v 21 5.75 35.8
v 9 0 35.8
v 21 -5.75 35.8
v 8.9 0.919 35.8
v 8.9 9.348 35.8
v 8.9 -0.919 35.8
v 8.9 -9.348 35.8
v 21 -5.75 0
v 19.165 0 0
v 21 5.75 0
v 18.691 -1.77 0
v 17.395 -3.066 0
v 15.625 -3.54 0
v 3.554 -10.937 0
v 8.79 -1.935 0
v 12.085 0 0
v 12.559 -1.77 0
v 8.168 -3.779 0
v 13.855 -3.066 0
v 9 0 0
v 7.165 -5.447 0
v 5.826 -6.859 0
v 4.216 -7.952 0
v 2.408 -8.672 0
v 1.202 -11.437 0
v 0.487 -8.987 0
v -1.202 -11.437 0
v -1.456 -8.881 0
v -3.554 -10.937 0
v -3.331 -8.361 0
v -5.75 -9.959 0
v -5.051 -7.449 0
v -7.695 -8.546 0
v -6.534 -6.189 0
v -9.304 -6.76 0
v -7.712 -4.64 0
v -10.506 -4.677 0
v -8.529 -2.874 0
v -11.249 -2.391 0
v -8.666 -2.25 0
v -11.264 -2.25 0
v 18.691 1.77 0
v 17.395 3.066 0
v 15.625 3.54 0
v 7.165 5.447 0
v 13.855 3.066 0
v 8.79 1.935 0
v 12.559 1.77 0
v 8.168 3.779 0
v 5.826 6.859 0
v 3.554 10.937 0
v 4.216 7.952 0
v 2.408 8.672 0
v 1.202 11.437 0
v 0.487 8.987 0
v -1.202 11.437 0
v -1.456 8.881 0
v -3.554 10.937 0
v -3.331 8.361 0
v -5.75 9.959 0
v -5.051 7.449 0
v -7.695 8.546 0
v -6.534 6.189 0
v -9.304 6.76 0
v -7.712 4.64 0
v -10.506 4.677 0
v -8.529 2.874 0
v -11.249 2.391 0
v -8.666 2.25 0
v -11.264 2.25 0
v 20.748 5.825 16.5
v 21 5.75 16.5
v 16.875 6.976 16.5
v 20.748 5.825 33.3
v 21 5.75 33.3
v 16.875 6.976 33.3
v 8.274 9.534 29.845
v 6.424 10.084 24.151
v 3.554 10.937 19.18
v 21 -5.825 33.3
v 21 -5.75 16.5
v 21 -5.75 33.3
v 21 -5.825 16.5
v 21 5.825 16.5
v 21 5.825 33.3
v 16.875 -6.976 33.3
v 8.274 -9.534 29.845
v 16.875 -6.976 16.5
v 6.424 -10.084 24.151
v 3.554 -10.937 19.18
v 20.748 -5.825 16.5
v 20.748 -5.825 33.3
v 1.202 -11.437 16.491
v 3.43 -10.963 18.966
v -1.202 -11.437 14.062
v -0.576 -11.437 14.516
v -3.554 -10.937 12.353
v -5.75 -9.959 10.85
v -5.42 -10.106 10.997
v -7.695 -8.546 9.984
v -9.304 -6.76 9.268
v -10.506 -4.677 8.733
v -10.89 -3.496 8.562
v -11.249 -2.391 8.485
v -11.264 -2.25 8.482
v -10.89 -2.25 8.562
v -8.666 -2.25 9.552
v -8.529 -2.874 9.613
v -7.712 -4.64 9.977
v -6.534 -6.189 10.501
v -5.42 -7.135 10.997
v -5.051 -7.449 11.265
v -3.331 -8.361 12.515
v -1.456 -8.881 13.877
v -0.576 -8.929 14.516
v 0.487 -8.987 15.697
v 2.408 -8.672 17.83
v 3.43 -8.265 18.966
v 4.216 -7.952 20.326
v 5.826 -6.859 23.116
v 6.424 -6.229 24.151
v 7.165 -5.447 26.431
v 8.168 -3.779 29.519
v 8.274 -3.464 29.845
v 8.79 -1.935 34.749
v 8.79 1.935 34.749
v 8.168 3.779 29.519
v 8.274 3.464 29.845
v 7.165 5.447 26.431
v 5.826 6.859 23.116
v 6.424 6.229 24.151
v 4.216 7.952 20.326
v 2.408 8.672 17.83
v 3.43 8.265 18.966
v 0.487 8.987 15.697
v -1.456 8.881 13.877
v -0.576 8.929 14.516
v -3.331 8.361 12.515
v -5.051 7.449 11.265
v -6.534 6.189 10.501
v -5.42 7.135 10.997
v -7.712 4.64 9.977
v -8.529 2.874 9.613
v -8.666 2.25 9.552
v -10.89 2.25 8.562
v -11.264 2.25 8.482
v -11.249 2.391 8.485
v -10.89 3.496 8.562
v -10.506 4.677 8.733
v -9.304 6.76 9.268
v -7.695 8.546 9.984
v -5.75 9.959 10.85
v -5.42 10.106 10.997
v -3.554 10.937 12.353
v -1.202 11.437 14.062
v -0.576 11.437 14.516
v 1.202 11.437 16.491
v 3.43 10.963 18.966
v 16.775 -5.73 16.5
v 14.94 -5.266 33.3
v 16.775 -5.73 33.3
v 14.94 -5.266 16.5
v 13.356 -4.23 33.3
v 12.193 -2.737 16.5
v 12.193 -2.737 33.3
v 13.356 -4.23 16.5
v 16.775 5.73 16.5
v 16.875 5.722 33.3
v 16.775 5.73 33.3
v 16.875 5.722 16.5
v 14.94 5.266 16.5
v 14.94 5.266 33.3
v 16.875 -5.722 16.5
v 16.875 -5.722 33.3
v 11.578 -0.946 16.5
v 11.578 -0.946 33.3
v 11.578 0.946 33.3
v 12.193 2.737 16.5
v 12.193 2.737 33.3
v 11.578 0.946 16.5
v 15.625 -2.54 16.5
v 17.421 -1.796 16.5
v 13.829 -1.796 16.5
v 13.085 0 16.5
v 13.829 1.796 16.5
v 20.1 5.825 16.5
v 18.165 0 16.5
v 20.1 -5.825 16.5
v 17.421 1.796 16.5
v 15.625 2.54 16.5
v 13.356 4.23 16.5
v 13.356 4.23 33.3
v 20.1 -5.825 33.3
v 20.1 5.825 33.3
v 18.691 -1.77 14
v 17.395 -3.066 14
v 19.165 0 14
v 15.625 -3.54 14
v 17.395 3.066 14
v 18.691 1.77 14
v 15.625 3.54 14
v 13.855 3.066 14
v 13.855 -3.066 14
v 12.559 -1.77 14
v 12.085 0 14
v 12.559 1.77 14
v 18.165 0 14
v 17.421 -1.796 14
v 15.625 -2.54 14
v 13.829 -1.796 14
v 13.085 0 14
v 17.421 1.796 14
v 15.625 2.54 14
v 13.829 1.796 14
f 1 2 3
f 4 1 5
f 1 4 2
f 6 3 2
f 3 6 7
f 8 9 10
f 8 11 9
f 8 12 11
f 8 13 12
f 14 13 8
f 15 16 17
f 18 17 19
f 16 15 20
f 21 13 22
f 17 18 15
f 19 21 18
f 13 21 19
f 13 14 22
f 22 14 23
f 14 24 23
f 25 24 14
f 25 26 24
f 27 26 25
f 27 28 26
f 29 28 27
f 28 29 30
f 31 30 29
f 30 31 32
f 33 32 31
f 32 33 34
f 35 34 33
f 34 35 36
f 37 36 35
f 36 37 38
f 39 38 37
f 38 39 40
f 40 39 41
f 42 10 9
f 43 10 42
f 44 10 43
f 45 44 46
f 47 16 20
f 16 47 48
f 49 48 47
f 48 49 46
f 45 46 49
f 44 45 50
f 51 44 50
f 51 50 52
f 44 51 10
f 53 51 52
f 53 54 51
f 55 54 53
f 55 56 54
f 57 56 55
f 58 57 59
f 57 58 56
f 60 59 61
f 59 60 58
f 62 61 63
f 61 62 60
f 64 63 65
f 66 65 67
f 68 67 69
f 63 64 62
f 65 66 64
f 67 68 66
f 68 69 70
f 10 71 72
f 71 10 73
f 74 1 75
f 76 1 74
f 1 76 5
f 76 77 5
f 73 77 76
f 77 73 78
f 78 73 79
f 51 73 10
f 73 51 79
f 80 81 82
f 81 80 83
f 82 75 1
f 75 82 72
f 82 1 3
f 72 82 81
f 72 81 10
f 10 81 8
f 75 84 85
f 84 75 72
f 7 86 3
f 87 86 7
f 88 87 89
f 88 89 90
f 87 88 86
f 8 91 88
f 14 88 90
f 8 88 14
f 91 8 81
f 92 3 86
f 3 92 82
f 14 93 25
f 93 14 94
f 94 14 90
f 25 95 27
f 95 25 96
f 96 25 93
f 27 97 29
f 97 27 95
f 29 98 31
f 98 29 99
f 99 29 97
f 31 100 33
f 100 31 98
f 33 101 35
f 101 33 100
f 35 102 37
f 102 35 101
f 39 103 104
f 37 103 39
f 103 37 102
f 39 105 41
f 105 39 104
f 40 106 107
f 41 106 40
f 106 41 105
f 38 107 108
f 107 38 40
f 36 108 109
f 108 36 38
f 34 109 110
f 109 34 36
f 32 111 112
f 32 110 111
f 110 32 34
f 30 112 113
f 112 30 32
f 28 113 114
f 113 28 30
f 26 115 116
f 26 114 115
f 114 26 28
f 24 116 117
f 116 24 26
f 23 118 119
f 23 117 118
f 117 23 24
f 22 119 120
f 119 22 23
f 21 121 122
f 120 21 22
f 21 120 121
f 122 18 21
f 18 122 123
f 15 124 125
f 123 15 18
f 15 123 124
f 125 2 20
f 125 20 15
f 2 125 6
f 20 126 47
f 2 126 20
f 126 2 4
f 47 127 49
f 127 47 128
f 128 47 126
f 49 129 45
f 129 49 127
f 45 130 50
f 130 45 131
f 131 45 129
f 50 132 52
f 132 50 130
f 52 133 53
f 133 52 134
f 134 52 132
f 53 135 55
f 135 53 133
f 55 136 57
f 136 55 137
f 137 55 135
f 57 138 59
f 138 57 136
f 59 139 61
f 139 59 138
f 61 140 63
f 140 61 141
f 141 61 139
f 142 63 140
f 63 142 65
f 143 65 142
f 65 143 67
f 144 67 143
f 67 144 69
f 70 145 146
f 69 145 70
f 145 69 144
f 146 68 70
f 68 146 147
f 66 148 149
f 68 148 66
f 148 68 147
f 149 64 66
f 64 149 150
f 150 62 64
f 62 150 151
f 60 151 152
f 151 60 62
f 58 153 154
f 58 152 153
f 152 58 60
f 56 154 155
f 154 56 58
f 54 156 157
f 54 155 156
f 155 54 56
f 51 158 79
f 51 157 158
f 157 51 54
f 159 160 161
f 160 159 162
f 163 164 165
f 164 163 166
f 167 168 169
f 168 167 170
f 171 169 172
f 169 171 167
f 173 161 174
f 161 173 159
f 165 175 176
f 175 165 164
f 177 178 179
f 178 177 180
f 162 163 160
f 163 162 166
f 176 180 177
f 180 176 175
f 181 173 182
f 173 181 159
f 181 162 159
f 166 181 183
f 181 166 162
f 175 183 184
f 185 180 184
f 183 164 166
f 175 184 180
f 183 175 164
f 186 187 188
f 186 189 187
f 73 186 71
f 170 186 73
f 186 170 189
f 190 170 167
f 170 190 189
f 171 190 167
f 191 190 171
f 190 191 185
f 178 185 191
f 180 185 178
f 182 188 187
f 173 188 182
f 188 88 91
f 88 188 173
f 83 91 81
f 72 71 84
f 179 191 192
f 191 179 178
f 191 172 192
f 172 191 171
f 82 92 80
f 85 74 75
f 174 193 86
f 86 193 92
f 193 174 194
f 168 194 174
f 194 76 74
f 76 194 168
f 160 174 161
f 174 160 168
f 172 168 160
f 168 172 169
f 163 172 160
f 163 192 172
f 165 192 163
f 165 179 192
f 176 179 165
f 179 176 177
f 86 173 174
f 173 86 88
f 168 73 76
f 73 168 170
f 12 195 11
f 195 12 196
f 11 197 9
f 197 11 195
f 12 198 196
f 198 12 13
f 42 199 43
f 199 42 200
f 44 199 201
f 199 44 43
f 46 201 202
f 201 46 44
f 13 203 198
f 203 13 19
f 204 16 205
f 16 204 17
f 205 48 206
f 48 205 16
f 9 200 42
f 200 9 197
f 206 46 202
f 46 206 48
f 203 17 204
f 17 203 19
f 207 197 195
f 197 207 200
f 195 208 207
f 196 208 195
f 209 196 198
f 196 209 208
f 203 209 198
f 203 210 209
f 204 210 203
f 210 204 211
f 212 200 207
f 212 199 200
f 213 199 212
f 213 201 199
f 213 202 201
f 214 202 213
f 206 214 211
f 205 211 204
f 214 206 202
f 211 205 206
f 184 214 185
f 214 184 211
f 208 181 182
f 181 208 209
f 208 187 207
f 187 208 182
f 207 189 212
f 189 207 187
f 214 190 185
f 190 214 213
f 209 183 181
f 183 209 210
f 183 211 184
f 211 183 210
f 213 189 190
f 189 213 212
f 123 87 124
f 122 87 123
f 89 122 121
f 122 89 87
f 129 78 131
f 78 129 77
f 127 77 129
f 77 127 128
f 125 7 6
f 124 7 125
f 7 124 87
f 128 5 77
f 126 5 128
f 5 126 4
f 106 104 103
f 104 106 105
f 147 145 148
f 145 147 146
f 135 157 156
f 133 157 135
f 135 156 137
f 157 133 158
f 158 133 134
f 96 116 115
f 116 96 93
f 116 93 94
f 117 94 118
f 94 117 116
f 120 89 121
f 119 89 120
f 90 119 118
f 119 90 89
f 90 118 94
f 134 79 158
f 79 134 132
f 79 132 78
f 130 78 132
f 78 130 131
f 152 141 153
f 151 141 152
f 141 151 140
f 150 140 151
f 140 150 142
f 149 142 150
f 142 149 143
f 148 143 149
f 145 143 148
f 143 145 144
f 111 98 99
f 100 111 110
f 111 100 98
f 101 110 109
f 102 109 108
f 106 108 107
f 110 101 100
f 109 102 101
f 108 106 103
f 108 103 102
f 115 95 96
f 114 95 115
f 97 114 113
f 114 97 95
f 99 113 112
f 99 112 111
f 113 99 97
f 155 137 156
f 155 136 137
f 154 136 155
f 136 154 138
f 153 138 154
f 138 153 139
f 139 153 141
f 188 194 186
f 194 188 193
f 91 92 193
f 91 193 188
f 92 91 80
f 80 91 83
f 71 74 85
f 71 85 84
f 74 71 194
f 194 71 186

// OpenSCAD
// [FL_INDEX: keywords="openscad, 3d_parametric, Customizable_Laser_Ring, csg_solid" | COT="Parametric OpenSCAD design from 3DCodeverse"]
// Title: Customizable Laser Ring


fingerWidth = 18; 
// your button cell's diameter.  (LR44 is 11.5)
batteryWidth = 11.5;  
// your button cell's height.  
batteryHeight = 5.6; 	
// need about 5 volts to work a laser, usually 3 batteries should do it.
batteryCount = 3; 		
// laser module's diameter
laserWidth = 7.08; 	
// laser modules length
laserHeight = 14;		
// how thick the walls are
thickness= 2.5;

batterySlot  = batteryHeight *batteryCount;
ringLength = (batterySlot) +( laserHeight+ thickness*2 );

translate([0,0,ringLength ] ) rotate([180, 0, 0]) laserRing();

module laserRing(){

	
	difference(){
		linear_extrude(height = ringLength) {
			face();
		}
		
		//battery slot
		translate([fingerWidth/2 + batteryWidth/2 +thickness  ,0,thickness]){
			cylinder(r = batteryWidth/2,  h = batterySlot  );
		
		}
		translate([fingerWidth/2 +batteryWidth/2 + thickness*2   ,0,thickness+ batterySlot/2]){
				cube([batteryWidth/2, batteryWidth*2, batterySlot], center=true);
			
		}
		//Laser Slot
		translate([fingerWidth/2 + batteryWidth/4 +thickness*1.5,0 ,thickness*2 +batterySlot  ]){
			cylinder(r=laserWidth/2, h =laserHeight );			
		}
		translate([fingerWidth/2 + batteryWidth/4 +thickness*1.5  ,0,thickness+batterySlot ]){
			cylinder(r=laserWidth/2-1, h =laserHeight +thickness);			
		}
		
		//
		translate([-(ringLength * .6)/2 - fingerWidth/2, 50, 0] ) rotate([90, 0, 0])
		cylinder(r = ringLength * .8, h = 100);
		
	}
	//support
	translate([fingerWidth/2 +batteryWidth/2 + thickness*2+ .8, 0, thickness+ batterySlot/2])
		cube([.9, batteryWidth/2 +thickness*2+.9, batterySlot], center = true) ;
}

module face(){

	difference(){
		hull(){	
			circle(r = fingerWidth/2 + thickness)  ;
			
			translate([ fingerWidth/2 + thickness/2, -(batteryWidth )/2, 0])
			square([batteryWidth/2 +thickness*2, (batteryWidth )]);
		}
		circle(r = fingerWidth/2);	
		translate([-fingerWidth/2, 0, 0]){
			square([fingerWidth,fingerWidth*.25], center = true);
		}
		
	}

}
